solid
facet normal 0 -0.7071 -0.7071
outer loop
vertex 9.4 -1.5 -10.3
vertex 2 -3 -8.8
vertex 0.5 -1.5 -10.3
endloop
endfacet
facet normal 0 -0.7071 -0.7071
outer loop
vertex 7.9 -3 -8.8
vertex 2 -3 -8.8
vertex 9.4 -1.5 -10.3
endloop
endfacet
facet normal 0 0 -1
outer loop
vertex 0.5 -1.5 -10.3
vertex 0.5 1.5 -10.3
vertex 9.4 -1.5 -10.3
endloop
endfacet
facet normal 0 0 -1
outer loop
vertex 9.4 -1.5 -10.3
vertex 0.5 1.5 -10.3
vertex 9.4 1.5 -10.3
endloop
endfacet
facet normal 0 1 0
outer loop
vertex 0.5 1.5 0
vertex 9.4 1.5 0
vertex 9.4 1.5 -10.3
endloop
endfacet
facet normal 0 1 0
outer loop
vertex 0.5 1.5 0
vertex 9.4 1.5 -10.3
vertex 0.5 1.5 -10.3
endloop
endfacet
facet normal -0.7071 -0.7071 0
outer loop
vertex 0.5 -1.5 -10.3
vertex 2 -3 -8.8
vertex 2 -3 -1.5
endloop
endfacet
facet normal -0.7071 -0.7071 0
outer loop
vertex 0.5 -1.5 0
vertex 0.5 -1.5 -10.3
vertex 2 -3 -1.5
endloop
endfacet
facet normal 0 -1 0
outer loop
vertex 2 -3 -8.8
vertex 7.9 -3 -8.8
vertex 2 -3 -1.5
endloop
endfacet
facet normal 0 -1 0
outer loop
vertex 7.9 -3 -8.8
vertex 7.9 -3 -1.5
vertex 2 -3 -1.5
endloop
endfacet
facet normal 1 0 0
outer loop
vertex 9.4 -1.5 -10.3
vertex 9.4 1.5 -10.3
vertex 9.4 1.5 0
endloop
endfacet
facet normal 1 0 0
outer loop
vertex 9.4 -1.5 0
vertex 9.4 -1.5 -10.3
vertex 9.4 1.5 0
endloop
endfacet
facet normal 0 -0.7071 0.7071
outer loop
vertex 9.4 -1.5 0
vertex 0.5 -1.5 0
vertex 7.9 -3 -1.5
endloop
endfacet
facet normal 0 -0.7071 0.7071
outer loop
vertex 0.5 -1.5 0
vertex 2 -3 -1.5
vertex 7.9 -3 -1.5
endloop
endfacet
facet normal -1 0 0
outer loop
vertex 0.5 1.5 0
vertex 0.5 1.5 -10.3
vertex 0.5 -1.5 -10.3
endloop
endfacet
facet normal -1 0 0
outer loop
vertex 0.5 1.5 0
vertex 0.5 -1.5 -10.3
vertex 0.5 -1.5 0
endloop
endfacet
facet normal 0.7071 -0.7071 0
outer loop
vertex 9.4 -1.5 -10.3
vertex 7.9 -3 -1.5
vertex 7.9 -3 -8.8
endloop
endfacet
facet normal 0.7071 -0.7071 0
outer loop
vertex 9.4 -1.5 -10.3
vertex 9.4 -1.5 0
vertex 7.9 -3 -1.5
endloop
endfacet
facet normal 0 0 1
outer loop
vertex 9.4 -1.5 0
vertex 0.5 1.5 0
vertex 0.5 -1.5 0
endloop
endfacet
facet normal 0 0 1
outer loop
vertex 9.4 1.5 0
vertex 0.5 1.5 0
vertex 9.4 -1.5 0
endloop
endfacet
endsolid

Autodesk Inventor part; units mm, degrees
ref_plane "YZ Plane" through (0, 0, 0) normal (1, 0, 0) x (0, 1, 0)
ref_plane "XZ Plane" through (0, 0, 0) normal (0, 1, 0) x (-1, 0, 0)
ref_plane "XY Plane" through (0, 0, 0) normal (0, 0, 1) x (1, 0, 0)
sketch "Sketch1" plane through (0, 0, 0) normal (0, 1, 0) x (-1, 0, 0)
  line L0 (0, 0) -> (-9.9, 0)
  line L1 (0, 0) -> (0, -10.3)
  line L2 (0, -10.3) -> (-9.9, -10.3)
  line L3 (-9.9, -10.3) -> (-9.9, 0)
  line L4 (-9.9, -10.3) -> (-9.4, -10.3)
  line L5 (-9.4, -10.3) -> (-9.4, 0)
  line L6 (0, -10.3) -> (-0.5, -10.3)
  line L7 (-0.5, -10.3) -> (-0.5, 0)
  line L8 (-0.5, 0.85) -> (-9.9, 0.85)
  line L9 (-9.9, 0.85) -> (-9.9, 0)
  line L10 (0, 0) -> (0, 0.85)
  line L11 (0, 0.85) -> (-0.5, 0.85)
  line L12 (0, -10.3) -> (0, -11.15)
  line L13 (0, -11.15) -> (-9.9, -11.15)
  line L14 (-9.9, -11.15) -> (-9.9, -10.3)
  line L15 (-9.9, -11.15) -> (-19.8, -11.15)
  line L16 (-19.8, -11.15) -> (-19.8, -10.3)
  line L17 (-19.8, -10.3) -> (-19.8, 0)
  line L18 (-19.3, -10.3) -> (-19.3, 0)
  line L19 (-9.9, -10.3) -> (-19.8, -10.3)
  line L20 (-10.4, -10.3) -> (-10.4, 0)
  line L21 (-9.9, 0) -> (-9.9, -10.3)
  line L22 (-9.9, 0) -> (-9.9, 0.85)
  line L23 (-9.9, 0.85) -> (-10.4, 0.85)
  line L24 (-10.4, 0.85) -> (-19.8, 0.85)
  line L25 (-9.9, 0) -> (-19.8, 0)
  line L26 (-19.8, 0.85) -> (-19.8, 0)
  line L27 (-19.8, -11.15) -> (-29.7, -11.15)
  line L28 (-29.7, -11.15) -> (-29.7, -10.3)
  line L29 (-29.7, -10.3) -> (-29.7, 0)
  line L30 (-29.2, -10.3) -> (-29.2, 0)
  line L31 (-19.8, -10.3) -> (-29.7, -10.3)
  line L32 (-20.3, -10.3) -> (-20.3, 0)
  line L33 (-19.8, 0) -> (-19.8, -10.3)
  line L34 (-19.8, 0) -> (-19.8, 0.85)
  line L35 (-19.8, 0.85) -> (-20.3, 0.85)
  line L36 (-20.3, 0.85) -> (-29.7, 0.85)
  line L37 (-19.8, 0) -> (-29.7, 0)
  line L38 (-29.7, 0.85) -> (-29.7, 0)
  line L39 (-29.7, -11.15) -> (-39.6, -11.15)
  line L40 (-39.6, -11.15) -> (-39.6, -10.3)
  line L41 (-39.6, -10.3) -> (-39.6, 0)
  line L42 (-39.1, -10.3) -> (-39.1, 0)
  line L43 (-29.7, -10.3) -> (-39.6, -10.3)
  line L44 (-30.2, -10.3) -> (-30.2, 0)
  line L45 (-29.7, 0) -> (-29.7, -10.3)
  line L46 (-29.7, 0) -> (-29.7, 0.85)
  line L47 (-29.7, 0.85) -> (-30.2, 0.85)
  line L48 (-30.2, 0.85) -> (-39.6, 0.85)
  line L49 (-29.7, 0) -> (-39.6, 0)
  line L50 (-39.6, 0.85) -> (-39.6, 0)
  line L51 (-39.6, -11.15) -> (-49.5, -11.15)
  line L52 (-49.5, -11.15) -> (-49.5, -10.3)
  line L53 (-49.5, -10.3) -> (-49.5, 0)
  line L54 (-49, -10.3) -> (-49, 0)
  line L55 (-39.6, -10.3) -> (-49.5, -10.3)
  line L56 (-40.1, -10.3) -> (-40.1, 0)
  line L57 (-39.6, 0) -> (-39.6, -10.3)
  line L58 (-39.6, 0) -> (-39.6, 0.85)
  line L59 (-39.6, 0.85) -> (-40.1, 0.85)
  line L60 (-40.1, 0.85) -> (-49.5, 0.85)
  line L61 (-39.6, 0) -> (-49.5, 0)
  line L62 (-49.5, 0.85) -> (-49.5, 0)
  line L63 (-49.5, -11.15) -> (-59.4, -11.15)
  line L64 (-59.4, -11.15) -> (-59.4, -10.3)
  line L65 (-59.4, -10.3) -> (-59.4, 0)
  line L66 (-58.9, -10.3) -> (-58.9, 0)
  line L67 (-49.5, -10.3) -> (-59.4, -10.3)
  line L68 (-50, -10.3) -> (-50, 0)
  line L69 (-49.5, 0) -> (-49.5, -10.3)
  line L70 (-49.5, 0) -> (-49.5, 0.85)
  line L71 (-49.5, 0.85) -> (-50, 0.85)
  line L72 (-50, 0.85) -> (-59.4, 0.85)
  line L73 (-49.5, 0) -> (-59.4, 0)
  line L74 (-59.4, 0.85) -> (-59.4, 0)
  line L75 (-59.4, -11.15) -> (-69.3, -11.15)
  line L76 (-69.3, -11.15) -> (-69.3, -10.3)
  line L77 (-69.3, -10.3) -> (-69.3, 0)
  line L78 (-68.8, -10.3) -> (-68.8, 0)
  line L79 (-59.4, -10.3) -> (-69.3, -10.3)
  line L80 (-59.9, -10.3) -> (-59.9, 0)
  line L81 (-59.4, 0) -> (-59.4, -10.3)
  line L82 (-59.4, 0) -> (-59.4, 0.85)
  line L83 (-59.4, 0.85) -> (-59.9, 0.85)
  line L84 (-59.9, 0.85) -> (-69.3, 0.85)
  line L85 (-59.4, 0) -> (-69.3, 0)
  line L86 (-69.3, 0.85) -> (-69.3, 0)
  line L87 (-69.3, -11.15) -> (-79.2, -11.15)
  line L88 (-79.2, -11.15) -> (-79.2, -10.3)
  line L89 (-79.2, -10.3) -> (-79.2, 0)
  line L90 (-78.7, -10.3) -> (-78.7, 0)
  line L91 (-69.3, -10.3) -> (-79.2, -10.3)
  line L92 (-69.8, -10.3) -> (-69.8, 0)
  line L93 (-69.3, 0) -> (-69.3, -10.3)
  line L94 (-69.3, 0) -> (-69.3, 0.85)
  line L95 (-69.3, 0.85) -> (-69.8, 0.85)
  line L96 (-69.8, 0.85) -> (-79.2, 0.85)
  line L97 (-69.3, 0) -> (-79.2, 0)
  line L98 (-79.2, 0.85) -> (-79.2, 0)
  line L99 (-79.2, -11.15) -> (-89.1, -11.15)
  line L100 (-89.1, -11.15) -> (-89.1, -10.3)
  line L101 (-89.1, -10.3) -> (-89.1, 0)
  line L102 (-88.6, -10.3) -> (-88.6, 0)
  line L103 (-79.2, -10.3) -> (-89.1, -10.3)
  line L104 (-79.7, -10.3) -> (-79.7, 0)
  line L105 (-79.2, 0) -> (-79.2, -10.3)
  line L106 (-79.2, 0) -> (-79.2, 0.85)
  line L107 (-79.2, 0.85) -> (-79.7, 0.85)
  line L108 (-79.7, 0.85) -> (-89.1, 0.85)
  line L109 (-79.2, 0) -> (-89.1, 0)
  line L110 (-89.1, 0.85) -> (-89.1, 0)
  line L111 (-89.1, -11.15) -> (-99, -11.15)
  line L112 (-99, -11.15) -> (-99, -10.3)
  line L113 (-99, -10.3) -> (-99, 0)
  line L114 (-98.5, -10.3) -> (-98.5, 0)
  line L115 (-89.1, -10.3) -> (-99, -10.3)
  line L116 (-89.6, -10.3) -> (-89.6, 0)
  line L117 (-89.1, 0) -> (-89.1, -10.3)
  line L118 (-89.1, 0) -> (-89.1, 0.85)
  line L119 (-89.1, 0.85) -> (-89.6, 0.85)
  line L120 (-89.6, 0.85) -> (-99, 0.85)
  line L121 (-89.1, 0) -> (-99, 0)
  line L122 (-99, 0.85) -> (-99, 0)
  line L123 (0, -11.15) -> (0, 0.85)
  line L124 (0, -11.15) -> (0, -12.65)
  line L125 (0, -12.65) -> (1.5, -12.65)
  line L126 (-99, 0.85) -> (-100.5, 0.85)
  line L127 (-100.5, 0.85) -> (-100.5, 2.35)
  line L128 (1.5, -12.65) -> (-100.5, -12.65)
  line L129 (-100.5, -12.65) -> (-100.5, 2.35)
  line L130 (-100.5, 2.35) -> (1.5, 2.35)
  line L131 (1.5, 2.35) -> (1.5, -12.65)
  line L132 (0, -11.15) -> (1.5, -11.15)
  line L133 (0, 0.85) -> (1.5, 0.85)
  line L134 (0, -11.15) -> (-2, -11.15)
  line L135 (-2, -11.15) -> (-2, 0.85)
  point P0 (-2, -10.3)
  point P1 (-2, 0)
  dimension "d0" = 9.9
  dimension "d1" = 10.3
  dimension "d2" = 0.5
  dimension "d3" = 0.5
  dimension "d6" = 0.85
  dimension "d7" = 0.85
  dimension "d10" = 9.9
  dimension "d15" = 1.5
  dimension "d16" = 1.5
  dimension "d19" = 1.5
  dimension "d20" = 2
extrude "Extrusion3" add sketch "Sketch1" against normal blind 3 contours L7 L2 L135 L0 | L135 L2 L5 L0
chamfer "Chamfer1" distance 1.5 angle 45 4 edges at (4.95, -3, 0) (9.4, -3, -5.15) (0.5, -3, -5.15) (4.95, -3, -10.3)
extrude "Extrusion4" add sketch "Sketch1" along normal blind 1.5 contours L7 L2 L135 L0 | L135 L2 L5 L0
properties part number "10x led strip diffuser"
